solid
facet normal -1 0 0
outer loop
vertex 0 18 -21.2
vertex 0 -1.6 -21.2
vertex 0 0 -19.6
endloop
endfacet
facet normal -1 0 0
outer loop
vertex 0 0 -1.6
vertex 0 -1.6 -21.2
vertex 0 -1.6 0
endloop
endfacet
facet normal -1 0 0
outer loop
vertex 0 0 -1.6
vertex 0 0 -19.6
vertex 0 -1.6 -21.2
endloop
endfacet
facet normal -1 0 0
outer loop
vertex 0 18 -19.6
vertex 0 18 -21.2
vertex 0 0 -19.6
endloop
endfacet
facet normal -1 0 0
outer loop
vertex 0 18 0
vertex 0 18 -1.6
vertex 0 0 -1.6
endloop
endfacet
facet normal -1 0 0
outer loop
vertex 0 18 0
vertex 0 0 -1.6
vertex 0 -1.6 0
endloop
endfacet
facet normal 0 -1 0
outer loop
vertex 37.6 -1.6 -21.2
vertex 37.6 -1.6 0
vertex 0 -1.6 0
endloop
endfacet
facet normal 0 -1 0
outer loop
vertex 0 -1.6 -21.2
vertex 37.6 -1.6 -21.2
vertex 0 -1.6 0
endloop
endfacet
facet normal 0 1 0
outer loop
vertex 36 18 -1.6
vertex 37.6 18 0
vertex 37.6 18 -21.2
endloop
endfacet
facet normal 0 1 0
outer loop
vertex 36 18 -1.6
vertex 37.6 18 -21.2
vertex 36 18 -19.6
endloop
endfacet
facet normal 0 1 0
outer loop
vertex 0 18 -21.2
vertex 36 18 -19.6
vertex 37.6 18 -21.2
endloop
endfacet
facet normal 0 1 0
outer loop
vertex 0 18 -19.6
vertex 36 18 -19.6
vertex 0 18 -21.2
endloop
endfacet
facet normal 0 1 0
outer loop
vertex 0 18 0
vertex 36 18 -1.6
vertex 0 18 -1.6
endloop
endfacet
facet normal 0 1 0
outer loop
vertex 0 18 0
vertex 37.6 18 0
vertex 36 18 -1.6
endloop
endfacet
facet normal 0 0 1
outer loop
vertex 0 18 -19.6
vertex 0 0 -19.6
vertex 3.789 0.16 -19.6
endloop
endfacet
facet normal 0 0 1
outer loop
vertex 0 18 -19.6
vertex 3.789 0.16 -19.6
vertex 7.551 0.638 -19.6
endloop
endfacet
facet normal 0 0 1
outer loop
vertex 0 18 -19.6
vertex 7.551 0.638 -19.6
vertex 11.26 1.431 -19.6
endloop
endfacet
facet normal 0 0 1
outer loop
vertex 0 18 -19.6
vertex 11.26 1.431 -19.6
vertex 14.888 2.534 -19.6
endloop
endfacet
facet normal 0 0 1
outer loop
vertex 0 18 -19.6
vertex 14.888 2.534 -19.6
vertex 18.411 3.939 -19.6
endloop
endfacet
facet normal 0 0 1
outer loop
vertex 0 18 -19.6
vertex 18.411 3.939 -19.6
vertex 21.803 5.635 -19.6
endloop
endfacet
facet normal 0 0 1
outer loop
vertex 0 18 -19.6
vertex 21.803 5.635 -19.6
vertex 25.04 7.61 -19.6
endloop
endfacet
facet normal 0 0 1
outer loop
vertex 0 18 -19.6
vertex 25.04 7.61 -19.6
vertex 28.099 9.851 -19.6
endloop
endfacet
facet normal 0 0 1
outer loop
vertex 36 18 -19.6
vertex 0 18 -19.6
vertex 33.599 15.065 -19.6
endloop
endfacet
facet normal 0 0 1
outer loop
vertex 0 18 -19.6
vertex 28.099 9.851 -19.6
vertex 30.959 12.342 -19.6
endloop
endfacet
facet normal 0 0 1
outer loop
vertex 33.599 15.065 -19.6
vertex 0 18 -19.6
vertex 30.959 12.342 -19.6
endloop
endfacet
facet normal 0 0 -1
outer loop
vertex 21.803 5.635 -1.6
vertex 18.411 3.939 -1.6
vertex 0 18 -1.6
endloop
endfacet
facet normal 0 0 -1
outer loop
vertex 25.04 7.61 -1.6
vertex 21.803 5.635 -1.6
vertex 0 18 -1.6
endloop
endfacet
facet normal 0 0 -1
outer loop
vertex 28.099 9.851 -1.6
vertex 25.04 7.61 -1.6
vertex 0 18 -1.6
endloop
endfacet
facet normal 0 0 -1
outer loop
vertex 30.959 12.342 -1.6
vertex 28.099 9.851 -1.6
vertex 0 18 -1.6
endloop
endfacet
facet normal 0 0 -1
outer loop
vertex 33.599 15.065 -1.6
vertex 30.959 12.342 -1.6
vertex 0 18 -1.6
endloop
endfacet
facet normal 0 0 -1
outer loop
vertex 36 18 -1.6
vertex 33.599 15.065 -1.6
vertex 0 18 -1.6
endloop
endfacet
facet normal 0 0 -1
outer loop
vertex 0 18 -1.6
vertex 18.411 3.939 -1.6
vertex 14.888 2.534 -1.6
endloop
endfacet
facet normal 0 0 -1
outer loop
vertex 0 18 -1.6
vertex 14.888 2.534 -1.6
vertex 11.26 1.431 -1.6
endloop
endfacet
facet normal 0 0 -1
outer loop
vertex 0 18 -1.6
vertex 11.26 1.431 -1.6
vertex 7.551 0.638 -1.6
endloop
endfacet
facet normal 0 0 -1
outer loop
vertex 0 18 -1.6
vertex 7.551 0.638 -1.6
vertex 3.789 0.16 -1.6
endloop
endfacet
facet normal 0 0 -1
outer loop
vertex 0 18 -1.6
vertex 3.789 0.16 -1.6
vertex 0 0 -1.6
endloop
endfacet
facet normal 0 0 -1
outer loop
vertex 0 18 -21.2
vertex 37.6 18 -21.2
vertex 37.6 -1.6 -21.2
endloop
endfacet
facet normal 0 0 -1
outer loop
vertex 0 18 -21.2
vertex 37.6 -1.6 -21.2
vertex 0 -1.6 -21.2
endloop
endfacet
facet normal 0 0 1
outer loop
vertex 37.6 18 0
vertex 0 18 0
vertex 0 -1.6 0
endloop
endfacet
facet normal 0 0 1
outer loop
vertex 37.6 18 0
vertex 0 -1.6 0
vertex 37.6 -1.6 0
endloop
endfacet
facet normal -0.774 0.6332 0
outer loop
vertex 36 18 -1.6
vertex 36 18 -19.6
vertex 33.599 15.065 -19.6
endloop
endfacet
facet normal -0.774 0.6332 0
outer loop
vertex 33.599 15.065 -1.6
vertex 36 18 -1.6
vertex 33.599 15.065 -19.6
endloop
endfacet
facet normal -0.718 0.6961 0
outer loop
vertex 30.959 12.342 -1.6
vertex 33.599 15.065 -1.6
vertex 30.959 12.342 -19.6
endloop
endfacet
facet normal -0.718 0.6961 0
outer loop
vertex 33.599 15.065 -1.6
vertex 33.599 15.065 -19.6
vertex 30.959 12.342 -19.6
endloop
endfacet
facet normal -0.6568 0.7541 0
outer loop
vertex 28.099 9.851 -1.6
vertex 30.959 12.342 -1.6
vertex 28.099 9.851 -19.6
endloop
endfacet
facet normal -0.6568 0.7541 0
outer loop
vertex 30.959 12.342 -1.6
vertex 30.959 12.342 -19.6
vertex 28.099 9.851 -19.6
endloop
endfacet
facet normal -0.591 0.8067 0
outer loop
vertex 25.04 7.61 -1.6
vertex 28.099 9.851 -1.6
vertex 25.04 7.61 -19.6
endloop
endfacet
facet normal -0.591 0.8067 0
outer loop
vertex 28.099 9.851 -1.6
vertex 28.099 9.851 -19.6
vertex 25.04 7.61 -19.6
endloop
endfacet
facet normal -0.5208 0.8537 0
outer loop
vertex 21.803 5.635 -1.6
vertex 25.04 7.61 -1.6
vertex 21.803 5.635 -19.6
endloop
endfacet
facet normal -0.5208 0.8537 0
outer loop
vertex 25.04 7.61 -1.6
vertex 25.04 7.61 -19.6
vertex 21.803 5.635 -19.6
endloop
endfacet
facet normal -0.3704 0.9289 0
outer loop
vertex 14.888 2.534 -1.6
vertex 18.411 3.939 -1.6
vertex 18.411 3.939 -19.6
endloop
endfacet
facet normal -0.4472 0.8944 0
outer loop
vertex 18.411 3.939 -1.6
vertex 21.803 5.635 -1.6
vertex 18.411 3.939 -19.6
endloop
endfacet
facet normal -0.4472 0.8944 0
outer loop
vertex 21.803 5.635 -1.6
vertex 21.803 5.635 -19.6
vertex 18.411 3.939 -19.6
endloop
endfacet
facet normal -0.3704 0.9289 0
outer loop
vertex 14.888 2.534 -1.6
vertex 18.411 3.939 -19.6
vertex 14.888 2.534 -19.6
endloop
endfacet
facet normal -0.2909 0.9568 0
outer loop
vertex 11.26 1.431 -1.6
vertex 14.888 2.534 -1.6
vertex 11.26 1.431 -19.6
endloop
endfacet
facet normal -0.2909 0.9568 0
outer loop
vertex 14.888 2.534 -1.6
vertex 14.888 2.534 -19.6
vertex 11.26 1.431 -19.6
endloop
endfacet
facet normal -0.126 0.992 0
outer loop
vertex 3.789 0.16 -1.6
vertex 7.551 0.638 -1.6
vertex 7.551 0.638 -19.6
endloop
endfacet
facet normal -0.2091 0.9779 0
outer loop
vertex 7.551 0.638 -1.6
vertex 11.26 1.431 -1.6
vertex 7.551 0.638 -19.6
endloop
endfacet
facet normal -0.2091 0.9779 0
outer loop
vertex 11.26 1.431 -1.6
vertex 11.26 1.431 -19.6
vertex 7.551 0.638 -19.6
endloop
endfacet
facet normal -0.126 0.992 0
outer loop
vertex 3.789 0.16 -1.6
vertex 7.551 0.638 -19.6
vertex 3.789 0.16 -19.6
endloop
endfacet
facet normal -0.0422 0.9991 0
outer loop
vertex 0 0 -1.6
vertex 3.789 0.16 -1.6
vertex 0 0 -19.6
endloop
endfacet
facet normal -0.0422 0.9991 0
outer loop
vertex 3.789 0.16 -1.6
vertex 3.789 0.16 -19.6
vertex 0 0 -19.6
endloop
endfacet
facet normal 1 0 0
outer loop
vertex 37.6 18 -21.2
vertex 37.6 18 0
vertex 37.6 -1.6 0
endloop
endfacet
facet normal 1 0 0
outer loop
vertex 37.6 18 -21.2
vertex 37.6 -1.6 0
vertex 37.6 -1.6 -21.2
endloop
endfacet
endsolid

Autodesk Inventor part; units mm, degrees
ref_plane "YZ Plane" through (0, 0, 0) normal (1, 0, 0) x (0, 1, 0)
ref_plane "XZ Plane" through (0, 0, 0) normal (0, 1, 0) x (-1, 0, 0)
ref_plane "XY Plane" through (0, 0, 0) normal (0, 0, 1) x (1, 0, 0)
sketch "Esboço1" plane through (0, 0, 0) normal (0, 1, 0) x (-1, 0, 0)
  line L0 (-36, -1.6) -> (0, -1.6)
  line L1 (0, -19.6) -> (-36, -19.6)
  line L2 (-36, -19.6) -> (-36, -1.6)
  line L3 (0, 0) -> (-37.6, 0)
  line L4 (-37.6, 0) -> (-37.6, -21.2)
  line L5 (-37.6, -21.2) -> (0, -21.2)
  line L6 (0, -21.2) -> (0, 0)
  dimension "d0" = 1.6
  dimension "d1" = 18
  dimension "d7" = 36
sketch "Esboço1 outline for Extrusão1" plane through (0, 0, 0) normal (0, 1, 0) x (-1, 0, 0)
  line L0 (0, -21.2) -> (0, 0)
  line L1 (-37.6, -21.2) -> (0, -21.2)
  line L2 (-37.6, 0) -> (-37.6, -21.2)
  line L3 (0, 0) -> (-37.6, 0)
extrude "Extrusão1" add sketch "Esboço1 outline for Extrusão1" against normal blind 1.6
sketch "Esboço1 outline for Extrusão2" plane through (0, 0, 0) normal (0, 1, 0) x (-1, 0, 0)
  line L0 (-36, -19.6) -> (-36, -1.6)
  line L1 (0, -19.6) -> (-36, -19.6)
  line L2 (0, -21.2) -> (0, -19.6)
  line L3 (-37.6, -21.2) -> (0, -21.2)
  line L4 (-37.6, 0) -> (-37.6, -21.2)
  line L5 (0, 0) -> (-37.6, 0)
  line L6 (0, -1.6) -> (0, 0)
  line L7 (-36, -1.6) -> (0, -1.6)
extrude "Extrusão2" add sketch "Esboço1 outline for Extrusão2" along normal blind 18
fillet "Arredondamento1" radius 45 1 edges at (36, 0, -10.6)
equation "\"d0\" = Margem"
equation "\"d1\" = Esfera"
equation "\"d7\" = 2 * Esfera"
equation "\"d2\" = Margem"
equation "\"d4\" = Esfera"
equation "\"d6\" = 2.5 * Esfera"
equation "\"Esfera\" = 18"
equation "\"Margem\" = 1.6"
properties part number "Peça que libera"
